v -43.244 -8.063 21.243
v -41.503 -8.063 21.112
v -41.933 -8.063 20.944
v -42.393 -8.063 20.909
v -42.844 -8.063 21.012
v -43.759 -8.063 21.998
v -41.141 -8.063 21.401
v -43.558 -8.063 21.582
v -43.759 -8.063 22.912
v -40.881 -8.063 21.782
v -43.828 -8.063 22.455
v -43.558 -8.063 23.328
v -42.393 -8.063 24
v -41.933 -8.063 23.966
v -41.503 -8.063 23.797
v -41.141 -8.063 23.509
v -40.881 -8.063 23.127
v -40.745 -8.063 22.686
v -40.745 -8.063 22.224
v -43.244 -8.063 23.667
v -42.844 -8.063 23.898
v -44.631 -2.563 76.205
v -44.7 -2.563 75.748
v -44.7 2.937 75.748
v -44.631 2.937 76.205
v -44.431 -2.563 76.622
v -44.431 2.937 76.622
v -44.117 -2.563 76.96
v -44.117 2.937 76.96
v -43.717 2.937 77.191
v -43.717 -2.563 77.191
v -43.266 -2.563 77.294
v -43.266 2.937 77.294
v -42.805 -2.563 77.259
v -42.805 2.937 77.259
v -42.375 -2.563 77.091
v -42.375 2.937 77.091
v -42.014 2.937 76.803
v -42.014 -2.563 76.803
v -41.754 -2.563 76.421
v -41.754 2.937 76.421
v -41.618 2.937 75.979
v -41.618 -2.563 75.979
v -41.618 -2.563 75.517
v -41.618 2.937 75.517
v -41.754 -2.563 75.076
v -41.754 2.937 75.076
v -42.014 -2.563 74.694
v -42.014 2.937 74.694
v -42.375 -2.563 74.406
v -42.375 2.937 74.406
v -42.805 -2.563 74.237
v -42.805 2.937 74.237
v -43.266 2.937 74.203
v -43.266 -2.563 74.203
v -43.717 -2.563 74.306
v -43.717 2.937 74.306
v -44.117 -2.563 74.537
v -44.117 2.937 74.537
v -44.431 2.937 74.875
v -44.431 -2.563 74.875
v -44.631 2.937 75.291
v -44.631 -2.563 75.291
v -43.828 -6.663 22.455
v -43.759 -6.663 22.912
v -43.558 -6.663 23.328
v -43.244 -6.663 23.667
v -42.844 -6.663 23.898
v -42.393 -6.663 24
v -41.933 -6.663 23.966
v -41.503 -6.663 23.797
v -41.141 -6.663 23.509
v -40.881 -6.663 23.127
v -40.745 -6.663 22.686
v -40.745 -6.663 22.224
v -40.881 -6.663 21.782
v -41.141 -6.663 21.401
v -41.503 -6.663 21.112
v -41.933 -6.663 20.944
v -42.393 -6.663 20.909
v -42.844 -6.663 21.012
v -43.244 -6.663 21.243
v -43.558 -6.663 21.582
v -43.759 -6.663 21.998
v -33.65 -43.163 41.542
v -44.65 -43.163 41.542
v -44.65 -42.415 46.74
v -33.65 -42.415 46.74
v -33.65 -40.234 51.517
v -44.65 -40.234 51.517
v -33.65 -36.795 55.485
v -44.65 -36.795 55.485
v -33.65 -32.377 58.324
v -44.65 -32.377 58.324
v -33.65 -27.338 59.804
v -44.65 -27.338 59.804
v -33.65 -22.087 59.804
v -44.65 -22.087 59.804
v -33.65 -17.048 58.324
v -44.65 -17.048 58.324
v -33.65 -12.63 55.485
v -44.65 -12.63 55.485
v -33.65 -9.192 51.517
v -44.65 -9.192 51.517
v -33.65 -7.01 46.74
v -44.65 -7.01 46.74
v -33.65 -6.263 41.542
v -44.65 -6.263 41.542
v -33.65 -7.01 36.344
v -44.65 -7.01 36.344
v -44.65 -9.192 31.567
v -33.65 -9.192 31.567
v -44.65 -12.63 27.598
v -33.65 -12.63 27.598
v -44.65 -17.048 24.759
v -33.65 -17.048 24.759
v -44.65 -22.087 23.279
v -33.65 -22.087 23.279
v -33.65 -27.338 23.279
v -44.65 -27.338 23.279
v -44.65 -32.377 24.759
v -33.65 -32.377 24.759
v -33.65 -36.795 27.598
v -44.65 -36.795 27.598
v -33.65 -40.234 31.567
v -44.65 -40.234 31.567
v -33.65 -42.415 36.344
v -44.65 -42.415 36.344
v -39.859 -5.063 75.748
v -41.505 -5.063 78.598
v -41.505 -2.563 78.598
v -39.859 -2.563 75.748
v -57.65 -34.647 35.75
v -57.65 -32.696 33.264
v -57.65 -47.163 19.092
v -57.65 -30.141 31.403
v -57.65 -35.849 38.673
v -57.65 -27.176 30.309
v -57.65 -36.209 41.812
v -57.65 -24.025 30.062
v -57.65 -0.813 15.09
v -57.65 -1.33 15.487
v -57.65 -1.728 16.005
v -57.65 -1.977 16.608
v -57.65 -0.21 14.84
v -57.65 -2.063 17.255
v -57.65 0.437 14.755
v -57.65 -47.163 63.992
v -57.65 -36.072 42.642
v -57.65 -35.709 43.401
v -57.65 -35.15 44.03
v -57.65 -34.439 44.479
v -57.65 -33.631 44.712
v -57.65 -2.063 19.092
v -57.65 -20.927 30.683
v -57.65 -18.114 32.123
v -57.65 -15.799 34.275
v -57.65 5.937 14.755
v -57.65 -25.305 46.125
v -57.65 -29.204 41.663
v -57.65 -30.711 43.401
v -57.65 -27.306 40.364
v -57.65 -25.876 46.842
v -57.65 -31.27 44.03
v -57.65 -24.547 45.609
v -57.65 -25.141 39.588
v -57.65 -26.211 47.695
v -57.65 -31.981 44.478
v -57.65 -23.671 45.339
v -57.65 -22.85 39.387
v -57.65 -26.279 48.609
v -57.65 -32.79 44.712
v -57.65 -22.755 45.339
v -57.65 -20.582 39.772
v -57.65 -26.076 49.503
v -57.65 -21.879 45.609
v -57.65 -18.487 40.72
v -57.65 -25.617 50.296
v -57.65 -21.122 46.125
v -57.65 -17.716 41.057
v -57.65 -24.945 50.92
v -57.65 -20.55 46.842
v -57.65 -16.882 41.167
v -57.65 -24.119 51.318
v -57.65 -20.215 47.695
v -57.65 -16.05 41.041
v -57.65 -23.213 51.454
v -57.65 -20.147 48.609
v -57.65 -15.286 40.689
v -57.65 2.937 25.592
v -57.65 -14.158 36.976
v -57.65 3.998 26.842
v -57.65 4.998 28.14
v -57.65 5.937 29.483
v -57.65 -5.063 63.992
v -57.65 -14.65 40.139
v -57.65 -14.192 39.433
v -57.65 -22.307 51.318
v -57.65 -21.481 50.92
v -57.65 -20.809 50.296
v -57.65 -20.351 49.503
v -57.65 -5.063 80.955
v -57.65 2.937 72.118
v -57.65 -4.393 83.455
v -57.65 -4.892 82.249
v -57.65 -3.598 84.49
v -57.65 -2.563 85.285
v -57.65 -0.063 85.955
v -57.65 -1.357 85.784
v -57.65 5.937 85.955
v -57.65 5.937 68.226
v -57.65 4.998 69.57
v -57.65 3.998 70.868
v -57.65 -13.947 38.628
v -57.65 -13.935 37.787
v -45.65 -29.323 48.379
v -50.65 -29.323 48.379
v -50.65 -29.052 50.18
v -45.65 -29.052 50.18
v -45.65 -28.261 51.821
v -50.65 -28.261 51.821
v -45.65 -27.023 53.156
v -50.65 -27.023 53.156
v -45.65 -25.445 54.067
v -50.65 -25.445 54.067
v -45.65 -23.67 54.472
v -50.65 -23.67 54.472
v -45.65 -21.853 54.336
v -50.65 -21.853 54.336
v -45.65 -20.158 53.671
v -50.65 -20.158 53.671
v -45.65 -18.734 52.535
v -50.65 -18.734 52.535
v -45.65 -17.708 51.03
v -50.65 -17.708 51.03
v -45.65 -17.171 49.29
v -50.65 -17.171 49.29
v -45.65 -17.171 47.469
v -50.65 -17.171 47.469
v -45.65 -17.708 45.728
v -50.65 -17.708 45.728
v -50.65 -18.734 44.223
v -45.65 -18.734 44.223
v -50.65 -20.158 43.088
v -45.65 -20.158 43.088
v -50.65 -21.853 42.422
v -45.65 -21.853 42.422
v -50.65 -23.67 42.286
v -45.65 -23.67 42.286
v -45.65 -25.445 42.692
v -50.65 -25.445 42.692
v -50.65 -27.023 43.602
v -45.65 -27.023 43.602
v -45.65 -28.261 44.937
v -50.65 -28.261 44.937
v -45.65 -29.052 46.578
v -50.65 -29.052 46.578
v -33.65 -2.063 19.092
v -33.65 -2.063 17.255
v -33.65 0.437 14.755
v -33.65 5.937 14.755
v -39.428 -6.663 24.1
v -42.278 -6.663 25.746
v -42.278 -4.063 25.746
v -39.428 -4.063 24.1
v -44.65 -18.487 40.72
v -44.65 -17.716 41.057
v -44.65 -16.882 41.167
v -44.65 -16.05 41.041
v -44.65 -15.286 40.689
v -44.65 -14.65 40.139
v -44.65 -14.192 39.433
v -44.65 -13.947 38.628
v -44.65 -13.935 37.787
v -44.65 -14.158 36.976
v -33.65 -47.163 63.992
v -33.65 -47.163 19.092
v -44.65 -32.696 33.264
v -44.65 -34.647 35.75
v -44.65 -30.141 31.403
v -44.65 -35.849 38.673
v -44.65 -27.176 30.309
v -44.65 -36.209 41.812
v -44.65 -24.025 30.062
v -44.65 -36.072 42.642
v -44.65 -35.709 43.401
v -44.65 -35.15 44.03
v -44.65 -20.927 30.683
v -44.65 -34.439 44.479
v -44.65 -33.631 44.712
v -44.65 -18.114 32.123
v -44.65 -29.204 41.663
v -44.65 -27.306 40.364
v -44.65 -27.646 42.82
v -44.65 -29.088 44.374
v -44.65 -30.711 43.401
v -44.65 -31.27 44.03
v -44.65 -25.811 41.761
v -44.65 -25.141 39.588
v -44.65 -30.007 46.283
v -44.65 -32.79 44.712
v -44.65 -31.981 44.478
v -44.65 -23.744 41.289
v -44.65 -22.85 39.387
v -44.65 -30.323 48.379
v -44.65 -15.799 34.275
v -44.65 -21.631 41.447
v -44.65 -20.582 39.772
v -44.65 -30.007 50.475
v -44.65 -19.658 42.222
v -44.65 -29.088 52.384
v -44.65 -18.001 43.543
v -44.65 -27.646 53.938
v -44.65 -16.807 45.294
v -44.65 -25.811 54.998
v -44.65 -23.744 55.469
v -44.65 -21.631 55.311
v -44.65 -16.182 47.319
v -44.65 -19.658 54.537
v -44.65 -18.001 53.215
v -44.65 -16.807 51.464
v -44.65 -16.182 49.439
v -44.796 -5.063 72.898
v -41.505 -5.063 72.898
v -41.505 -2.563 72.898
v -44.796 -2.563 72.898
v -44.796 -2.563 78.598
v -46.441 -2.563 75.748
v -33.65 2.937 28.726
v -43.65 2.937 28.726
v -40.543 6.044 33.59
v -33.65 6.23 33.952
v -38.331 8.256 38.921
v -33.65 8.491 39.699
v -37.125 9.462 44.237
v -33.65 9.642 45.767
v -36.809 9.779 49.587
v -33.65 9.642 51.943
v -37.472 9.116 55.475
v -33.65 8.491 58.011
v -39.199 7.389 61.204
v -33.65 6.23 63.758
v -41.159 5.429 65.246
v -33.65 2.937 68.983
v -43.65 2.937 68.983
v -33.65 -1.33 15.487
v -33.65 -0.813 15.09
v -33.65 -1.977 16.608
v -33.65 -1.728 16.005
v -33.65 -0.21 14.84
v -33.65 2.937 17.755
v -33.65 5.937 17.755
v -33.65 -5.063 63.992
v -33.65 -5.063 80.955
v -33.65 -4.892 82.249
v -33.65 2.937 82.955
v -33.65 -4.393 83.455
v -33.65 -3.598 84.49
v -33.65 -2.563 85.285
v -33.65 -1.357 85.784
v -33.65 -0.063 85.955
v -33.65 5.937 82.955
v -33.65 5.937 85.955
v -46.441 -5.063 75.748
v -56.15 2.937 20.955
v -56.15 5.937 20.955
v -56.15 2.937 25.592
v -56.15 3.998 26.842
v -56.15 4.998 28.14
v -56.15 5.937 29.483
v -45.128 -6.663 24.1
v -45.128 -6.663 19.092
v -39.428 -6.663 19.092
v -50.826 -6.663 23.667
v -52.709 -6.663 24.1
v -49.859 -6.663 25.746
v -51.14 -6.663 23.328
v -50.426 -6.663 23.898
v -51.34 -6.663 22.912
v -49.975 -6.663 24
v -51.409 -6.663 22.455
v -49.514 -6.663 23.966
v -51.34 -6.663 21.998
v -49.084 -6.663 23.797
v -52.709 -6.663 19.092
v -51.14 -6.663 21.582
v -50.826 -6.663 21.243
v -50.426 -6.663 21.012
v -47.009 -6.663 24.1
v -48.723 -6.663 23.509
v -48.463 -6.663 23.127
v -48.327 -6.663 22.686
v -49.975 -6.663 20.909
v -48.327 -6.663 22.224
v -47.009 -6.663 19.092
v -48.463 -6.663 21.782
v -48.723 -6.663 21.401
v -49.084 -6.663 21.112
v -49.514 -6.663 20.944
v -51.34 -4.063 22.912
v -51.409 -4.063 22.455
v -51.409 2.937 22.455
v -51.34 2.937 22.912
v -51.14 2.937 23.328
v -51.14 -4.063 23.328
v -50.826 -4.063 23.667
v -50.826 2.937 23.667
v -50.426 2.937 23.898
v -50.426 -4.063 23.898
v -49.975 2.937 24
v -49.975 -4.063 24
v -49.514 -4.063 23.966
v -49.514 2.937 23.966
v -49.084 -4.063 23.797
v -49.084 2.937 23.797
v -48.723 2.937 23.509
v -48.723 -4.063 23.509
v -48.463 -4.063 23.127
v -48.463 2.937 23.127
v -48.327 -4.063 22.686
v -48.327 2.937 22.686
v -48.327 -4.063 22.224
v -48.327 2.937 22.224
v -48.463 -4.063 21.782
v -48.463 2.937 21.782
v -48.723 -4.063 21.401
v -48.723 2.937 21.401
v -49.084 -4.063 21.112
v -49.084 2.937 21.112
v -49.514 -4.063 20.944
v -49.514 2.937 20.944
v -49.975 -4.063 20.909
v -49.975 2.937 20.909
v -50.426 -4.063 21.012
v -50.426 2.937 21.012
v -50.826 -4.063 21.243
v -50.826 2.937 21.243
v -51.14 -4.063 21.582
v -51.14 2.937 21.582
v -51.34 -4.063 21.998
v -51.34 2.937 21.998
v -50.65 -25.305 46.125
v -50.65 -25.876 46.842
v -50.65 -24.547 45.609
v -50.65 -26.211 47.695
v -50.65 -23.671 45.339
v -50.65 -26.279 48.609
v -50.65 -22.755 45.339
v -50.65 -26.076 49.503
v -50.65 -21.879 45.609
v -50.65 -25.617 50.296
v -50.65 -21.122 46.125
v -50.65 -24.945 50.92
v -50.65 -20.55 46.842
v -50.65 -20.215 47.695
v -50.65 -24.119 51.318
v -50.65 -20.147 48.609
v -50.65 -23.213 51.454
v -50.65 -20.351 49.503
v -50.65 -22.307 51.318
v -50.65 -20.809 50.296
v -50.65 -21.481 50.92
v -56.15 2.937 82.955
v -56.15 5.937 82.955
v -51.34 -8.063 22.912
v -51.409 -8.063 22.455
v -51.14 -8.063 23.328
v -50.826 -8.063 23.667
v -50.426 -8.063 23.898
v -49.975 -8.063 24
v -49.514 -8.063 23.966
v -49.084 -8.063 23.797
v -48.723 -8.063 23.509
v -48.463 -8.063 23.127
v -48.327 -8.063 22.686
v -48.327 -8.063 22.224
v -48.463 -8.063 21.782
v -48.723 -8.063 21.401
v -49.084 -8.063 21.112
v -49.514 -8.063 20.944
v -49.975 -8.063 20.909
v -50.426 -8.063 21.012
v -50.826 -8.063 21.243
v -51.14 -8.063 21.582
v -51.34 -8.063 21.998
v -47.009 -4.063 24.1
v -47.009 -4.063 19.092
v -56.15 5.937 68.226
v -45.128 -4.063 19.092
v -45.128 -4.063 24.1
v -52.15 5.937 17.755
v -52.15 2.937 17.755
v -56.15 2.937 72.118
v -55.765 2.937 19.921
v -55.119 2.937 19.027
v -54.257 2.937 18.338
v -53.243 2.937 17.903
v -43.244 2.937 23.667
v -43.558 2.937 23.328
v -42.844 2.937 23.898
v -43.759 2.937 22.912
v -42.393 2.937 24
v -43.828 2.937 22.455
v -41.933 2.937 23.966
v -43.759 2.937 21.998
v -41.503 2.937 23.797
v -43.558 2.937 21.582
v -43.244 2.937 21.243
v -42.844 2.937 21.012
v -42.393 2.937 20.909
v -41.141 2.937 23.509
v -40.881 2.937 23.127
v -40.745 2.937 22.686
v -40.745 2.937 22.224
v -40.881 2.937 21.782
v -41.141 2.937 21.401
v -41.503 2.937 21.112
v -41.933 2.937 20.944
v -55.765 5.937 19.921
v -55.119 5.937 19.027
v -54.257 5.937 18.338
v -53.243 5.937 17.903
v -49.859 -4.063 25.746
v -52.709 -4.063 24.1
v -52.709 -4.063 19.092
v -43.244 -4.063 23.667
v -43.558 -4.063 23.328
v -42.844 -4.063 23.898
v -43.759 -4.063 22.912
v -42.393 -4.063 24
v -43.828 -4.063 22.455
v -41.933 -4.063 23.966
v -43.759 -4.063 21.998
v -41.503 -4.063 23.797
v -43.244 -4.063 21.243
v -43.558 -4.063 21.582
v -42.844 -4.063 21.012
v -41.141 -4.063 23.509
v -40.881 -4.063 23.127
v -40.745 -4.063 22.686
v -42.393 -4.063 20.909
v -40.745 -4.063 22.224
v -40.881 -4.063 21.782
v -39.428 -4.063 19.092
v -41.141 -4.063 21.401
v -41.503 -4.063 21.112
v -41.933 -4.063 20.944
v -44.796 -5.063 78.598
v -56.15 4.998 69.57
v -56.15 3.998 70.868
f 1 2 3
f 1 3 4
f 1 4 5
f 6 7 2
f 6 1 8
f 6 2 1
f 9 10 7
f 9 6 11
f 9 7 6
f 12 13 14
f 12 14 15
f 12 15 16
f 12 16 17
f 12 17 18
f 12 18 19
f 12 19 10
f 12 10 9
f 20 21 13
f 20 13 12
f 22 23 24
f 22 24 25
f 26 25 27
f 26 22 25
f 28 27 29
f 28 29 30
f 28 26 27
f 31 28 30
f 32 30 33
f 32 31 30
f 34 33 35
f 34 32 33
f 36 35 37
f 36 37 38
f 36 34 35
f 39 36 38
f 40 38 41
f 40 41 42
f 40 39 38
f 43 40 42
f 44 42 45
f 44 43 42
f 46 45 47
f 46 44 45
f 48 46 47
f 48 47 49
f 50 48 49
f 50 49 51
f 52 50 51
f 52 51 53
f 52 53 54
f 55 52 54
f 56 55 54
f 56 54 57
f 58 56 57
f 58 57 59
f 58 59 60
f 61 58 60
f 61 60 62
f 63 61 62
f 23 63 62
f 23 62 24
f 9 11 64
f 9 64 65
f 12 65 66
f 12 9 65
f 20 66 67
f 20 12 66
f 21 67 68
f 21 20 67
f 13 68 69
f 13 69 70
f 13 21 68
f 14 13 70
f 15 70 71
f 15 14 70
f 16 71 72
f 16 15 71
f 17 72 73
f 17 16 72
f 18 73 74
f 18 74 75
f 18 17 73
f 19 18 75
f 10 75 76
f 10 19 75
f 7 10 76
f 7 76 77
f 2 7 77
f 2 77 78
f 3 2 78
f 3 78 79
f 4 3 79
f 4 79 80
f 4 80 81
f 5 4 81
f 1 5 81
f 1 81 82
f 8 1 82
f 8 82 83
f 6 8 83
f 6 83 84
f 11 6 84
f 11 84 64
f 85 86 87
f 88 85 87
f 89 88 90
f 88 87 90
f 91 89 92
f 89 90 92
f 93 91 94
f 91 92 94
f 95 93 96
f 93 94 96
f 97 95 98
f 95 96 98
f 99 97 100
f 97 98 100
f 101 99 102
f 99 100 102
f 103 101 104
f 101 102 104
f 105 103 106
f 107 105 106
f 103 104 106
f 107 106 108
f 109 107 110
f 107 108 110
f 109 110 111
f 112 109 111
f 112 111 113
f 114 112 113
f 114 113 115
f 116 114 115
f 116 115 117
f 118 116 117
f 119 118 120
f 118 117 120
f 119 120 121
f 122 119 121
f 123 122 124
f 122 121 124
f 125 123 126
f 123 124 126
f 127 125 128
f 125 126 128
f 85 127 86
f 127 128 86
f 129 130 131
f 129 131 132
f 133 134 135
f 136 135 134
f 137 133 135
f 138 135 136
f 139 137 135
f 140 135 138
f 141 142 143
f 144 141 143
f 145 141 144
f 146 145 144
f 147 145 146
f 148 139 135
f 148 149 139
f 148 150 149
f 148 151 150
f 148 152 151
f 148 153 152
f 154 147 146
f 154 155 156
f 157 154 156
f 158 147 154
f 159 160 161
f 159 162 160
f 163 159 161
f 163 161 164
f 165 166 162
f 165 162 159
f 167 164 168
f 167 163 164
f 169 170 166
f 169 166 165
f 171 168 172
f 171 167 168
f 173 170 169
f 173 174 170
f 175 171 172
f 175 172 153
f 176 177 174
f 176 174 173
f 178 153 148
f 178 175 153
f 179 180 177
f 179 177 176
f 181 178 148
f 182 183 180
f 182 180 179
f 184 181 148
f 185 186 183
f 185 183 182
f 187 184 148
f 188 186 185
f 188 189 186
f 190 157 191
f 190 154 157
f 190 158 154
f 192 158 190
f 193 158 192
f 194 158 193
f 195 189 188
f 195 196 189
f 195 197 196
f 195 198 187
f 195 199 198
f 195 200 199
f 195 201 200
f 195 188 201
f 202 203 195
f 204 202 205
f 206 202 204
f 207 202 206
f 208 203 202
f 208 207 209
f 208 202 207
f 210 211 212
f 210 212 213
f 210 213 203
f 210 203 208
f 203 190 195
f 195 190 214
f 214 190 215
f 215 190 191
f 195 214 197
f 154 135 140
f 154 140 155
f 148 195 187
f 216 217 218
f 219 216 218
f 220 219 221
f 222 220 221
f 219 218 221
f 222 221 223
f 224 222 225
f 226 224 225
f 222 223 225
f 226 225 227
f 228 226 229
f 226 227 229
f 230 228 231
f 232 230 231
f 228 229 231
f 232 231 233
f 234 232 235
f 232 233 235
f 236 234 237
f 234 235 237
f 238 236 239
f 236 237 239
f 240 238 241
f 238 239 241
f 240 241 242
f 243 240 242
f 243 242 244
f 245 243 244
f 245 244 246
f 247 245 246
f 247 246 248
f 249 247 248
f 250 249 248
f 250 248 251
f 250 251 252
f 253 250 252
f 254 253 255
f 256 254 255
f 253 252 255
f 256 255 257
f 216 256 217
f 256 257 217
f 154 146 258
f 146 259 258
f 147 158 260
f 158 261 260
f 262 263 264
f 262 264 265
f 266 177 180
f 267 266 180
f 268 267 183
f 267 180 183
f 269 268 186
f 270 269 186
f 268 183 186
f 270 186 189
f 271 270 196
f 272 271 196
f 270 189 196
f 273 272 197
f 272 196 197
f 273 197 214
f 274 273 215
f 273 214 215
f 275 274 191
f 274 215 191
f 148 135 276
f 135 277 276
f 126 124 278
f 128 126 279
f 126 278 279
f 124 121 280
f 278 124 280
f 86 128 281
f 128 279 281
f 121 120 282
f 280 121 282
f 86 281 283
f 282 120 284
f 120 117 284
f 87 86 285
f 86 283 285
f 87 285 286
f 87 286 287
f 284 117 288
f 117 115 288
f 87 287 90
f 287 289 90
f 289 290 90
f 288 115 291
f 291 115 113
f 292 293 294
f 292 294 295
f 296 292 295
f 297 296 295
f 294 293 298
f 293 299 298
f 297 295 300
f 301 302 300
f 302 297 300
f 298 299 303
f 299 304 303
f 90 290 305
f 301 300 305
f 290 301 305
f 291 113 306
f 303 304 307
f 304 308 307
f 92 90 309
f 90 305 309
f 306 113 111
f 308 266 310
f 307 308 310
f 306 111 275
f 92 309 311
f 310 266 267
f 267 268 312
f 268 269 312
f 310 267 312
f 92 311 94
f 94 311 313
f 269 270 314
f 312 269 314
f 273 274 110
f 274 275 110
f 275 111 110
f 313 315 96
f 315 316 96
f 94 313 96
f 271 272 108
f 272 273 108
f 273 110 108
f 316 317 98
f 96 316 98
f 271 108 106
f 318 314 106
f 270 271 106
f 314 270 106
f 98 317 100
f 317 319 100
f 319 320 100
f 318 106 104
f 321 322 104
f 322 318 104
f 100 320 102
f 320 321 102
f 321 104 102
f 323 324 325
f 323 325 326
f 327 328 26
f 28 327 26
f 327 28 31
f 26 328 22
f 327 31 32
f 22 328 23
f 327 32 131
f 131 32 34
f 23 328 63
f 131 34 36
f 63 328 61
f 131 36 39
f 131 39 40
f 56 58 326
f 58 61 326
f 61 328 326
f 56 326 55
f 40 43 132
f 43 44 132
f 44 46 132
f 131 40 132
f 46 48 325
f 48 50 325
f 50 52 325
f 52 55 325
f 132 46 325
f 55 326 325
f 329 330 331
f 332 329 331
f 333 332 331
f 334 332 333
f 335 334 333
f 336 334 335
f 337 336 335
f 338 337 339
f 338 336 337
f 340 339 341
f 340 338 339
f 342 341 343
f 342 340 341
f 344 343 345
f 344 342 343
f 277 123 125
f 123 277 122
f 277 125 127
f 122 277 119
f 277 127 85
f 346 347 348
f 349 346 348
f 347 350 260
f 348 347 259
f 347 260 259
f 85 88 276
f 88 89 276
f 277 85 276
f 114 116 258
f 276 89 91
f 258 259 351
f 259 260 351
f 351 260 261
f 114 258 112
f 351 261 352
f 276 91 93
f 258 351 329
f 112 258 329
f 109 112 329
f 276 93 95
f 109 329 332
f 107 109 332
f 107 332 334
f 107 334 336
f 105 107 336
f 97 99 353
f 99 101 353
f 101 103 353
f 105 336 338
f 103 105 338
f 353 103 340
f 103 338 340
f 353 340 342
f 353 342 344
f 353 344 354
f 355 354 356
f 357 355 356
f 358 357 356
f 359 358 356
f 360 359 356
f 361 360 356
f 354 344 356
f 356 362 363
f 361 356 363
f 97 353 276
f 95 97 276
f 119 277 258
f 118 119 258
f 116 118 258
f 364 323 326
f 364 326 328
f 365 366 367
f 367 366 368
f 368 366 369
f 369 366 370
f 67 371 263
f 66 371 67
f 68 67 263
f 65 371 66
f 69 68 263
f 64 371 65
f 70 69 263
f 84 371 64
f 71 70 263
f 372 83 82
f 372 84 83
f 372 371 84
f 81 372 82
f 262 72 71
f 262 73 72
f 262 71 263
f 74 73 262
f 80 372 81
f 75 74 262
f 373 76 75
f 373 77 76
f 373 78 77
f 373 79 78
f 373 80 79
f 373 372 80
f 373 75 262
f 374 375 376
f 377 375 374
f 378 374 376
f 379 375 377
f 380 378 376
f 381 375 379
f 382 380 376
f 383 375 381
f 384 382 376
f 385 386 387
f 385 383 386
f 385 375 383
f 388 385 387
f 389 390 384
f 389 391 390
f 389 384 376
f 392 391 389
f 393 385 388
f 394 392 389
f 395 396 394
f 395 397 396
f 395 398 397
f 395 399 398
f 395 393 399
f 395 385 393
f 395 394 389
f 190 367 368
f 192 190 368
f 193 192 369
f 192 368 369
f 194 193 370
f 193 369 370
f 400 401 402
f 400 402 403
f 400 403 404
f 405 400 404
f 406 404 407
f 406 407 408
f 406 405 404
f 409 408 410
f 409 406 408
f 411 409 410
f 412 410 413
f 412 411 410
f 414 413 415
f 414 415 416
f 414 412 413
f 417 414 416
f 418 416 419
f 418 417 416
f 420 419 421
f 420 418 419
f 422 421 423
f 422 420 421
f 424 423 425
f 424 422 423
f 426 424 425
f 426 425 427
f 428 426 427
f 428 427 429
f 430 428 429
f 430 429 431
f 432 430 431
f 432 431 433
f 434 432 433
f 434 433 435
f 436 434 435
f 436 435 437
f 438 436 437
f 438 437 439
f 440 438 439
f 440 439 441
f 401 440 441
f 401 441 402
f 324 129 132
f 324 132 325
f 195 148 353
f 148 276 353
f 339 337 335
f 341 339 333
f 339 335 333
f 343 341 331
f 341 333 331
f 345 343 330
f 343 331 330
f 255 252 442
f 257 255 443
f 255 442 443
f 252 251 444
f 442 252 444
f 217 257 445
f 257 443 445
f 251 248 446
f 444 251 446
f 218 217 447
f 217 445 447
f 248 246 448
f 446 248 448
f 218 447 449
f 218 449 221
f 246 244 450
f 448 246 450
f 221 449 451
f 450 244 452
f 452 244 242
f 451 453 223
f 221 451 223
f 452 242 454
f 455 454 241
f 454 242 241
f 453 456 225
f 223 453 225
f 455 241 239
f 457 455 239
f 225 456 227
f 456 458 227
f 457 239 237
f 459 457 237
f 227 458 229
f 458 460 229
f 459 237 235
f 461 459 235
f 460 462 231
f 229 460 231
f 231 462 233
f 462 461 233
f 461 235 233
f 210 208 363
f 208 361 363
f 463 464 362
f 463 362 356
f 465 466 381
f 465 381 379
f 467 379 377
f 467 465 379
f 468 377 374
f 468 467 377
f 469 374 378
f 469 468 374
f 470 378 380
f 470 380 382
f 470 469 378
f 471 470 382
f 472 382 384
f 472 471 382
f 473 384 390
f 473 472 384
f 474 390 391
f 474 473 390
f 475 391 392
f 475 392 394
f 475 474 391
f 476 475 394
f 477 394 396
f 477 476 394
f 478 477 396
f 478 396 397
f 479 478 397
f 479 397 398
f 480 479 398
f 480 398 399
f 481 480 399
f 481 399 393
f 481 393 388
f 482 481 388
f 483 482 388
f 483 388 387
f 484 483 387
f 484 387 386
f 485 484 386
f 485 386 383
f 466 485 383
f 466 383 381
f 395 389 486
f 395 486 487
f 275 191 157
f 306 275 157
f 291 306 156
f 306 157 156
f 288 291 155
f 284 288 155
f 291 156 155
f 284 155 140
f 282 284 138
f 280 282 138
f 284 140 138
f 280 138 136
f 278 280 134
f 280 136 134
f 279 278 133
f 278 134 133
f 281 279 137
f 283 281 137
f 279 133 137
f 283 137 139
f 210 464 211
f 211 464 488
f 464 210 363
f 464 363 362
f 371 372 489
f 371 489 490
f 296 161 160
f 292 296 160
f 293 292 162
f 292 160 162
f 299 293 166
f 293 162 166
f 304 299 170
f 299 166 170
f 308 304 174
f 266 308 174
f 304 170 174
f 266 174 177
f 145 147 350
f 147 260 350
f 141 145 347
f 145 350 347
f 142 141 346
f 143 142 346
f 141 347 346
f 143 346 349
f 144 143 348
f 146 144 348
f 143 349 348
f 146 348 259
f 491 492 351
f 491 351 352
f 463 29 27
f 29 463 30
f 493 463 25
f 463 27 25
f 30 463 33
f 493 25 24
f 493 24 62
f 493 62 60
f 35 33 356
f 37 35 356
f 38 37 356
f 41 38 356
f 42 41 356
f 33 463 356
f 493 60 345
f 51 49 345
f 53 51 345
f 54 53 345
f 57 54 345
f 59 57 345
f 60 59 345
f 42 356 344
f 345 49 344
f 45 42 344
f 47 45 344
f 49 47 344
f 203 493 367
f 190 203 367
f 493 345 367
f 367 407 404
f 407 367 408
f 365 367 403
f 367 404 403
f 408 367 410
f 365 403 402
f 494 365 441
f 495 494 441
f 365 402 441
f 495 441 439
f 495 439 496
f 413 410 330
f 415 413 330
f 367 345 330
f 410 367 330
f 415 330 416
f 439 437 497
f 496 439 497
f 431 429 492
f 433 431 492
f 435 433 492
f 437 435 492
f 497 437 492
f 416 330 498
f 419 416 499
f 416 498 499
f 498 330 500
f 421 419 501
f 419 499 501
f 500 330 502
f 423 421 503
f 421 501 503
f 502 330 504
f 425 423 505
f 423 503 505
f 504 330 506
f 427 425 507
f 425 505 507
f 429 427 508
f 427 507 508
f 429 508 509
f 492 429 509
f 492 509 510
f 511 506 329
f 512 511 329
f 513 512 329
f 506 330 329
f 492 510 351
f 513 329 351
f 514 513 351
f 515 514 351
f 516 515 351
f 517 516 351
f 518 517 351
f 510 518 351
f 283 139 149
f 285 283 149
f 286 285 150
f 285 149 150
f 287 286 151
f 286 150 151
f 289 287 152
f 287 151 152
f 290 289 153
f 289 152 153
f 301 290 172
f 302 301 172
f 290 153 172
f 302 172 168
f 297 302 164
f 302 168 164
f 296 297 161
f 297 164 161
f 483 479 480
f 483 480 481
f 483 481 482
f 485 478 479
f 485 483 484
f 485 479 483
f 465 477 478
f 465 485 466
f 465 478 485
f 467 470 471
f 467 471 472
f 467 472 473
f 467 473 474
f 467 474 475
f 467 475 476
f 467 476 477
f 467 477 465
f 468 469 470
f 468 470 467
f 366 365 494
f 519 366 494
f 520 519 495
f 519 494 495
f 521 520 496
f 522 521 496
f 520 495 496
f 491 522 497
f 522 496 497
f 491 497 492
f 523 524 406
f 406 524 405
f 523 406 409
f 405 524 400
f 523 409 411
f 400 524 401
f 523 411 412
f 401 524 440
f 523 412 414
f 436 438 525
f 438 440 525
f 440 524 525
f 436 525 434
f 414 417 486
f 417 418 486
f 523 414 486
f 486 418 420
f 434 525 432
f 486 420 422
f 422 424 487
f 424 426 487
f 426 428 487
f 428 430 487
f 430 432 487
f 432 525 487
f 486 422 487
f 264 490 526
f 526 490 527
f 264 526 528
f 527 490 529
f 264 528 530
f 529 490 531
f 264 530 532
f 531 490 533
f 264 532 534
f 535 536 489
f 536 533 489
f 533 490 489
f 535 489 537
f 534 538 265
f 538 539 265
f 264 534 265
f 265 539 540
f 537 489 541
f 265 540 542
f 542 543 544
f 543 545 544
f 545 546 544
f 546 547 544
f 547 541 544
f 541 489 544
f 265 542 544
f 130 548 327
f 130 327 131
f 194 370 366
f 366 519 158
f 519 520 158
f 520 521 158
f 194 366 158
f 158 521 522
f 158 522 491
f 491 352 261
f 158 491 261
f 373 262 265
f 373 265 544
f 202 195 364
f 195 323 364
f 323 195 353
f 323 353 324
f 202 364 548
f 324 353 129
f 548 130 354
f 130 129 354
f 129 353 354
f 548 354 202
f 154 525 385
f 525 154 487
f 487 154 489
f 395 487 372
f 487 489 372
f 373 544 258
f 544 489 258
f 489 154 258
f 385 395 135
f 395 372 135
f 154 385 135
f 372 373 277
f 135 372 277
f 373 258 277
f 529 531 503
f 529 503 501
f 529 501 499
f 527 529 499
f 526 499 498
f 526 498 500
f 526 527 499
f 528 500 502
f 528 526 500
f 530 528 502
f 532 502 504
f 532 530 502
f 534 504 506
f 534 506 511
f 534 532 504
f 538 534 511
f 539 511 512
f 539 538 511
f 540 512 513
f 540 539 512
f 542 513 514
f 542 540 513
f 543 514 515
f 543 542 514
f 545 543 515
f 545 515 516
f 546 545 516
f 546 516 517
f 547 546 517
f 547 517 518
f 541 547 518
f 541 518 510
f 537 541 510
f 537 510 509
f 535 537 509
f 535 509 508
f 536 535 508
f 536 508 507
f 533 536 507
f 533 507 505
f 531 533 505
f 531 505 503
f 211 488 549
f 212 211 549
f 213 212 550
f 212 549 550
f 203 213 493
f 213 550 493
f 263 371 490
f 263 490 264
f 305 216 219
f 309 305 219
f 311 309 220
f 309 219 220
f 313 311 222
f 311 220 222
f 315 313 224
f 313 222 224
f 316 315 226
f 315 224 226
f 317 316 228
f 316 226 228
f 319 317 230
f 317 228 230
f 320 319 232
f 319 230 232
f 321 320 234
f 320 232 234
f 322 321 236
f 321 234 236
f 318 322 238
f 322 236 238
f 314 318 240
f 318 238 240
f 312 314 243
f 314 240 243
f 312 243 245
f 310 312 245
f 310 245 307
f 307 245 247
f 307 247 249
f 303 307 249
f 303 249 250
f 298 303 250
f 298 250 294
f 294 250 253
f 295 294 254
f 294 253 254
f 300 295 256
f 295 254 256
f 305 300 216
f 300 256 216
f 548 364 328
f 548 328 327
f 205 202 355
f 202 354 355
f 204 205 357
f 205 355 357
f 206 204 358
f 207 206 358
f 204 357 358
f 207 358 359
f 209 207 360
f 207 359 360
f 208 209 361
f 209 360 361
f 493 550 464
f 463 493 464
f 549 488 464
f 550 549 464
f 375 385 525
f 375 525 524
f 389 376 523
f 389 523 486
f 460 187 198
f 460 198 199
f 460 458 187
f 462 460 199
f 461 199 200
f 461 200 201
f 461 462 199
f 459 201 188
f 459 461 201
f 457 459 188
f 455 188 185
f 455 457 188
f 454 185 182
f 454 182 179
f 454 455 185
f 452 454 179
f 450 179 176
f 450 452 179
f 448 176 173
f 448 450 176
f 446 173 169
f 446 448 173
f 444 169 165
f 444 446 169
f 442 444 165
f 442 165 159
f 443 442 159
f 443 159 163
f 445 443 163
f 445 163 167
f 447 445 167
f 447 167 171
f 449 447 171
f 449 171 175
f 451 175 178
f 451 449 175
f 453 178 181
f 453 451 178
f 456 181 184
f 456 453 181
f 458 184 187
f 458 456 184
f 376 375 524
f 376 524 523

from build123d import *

# Parameters (mm, degrees)
SKETCH1_R           = 22.45
SKETCH1_R_2         = 18.45
SKETCH1_R_3         = 6.11
SKETCH1_R_4         = 5.25
SKETCH1_R_5         = 3.075
BOSS_EXTRUDE1_DEPTH = 5.5
SKETCH1_3_R         = 22.45
SKETCH1_3_R_2       = 18.45
SKETCH1_3_R_3       = 6.11
BOSS_EXTRUDE2_DEPTH = 6
BOSS_EXTRUDE3_START = -6
SKETCH1_4_R         = 22.45
SKETCH1_4_R_2       = 18.45
BOSS_EXTRUDE3_DEPTH = 11
BOSS_EXTRUDE4_DEPTH = 10
DRAFT1_ANGLE        = 45
BOSS_EXTRUDE5_DEPTH = 3
SKETCH4_R           = 3.075
BOSS_EXTRUDE6_DEPTH = 1.5
CUT_EXTRUDE1_START  = -11
SKETCH3_3_R         = 1.55
CUT_EXTRUDE1_DEPTH  = 11
CUT_EXTRUDE2_START  = -9.6
SKETCH3_4_R         = 1.55
CUT_EXTRUDE2_DEPTH  = 2.6
CUT_EXTRUDE3_START  = -8
SKETCH3_5_R         = 1.55
CUT_EXTRUDE3_DEPTH  = 2.5
CUT_EXTRUDE4_DEPTH  = 13
CHAMFER1_SIZE       = 1


with BuildPart() as part:
    # Sketch1 → Boss-Extrude1 (new body)
    with BuildSketch(Plane.ZY.offset(50.650222499)):
        with Locations((41.541684016, -24.712638018)):
            Circle(SKETCH1_R)
        with Locations((41.541684016, -24.712638018)):
            Circle(SKETCH1_R_2, mode=Mode.SUBTRACT)
        with Locations((41.541684016, -24.712638018)):
            Circle(SKETCH1_R_2)
        with Locations((48.379176073, -23.213070625)):
            Circle(SKETCH1_R_3, mode=Mode.SUBTRACT)
        with Locations((48.379176073, -23.213070625)):
            Circle(SKETCH1_R_3)
        with Locations((48.379176073, -23.213070625)):
            Circle(SKETCH1_R_4, mode=Mode.SUBTRACT)
        with Locations((48.379176073, -23.213070625)):
            Circle(SKETCH1_R_4)
        with Locations((48.379176073, -23.213070625)):
            Circle(SKETCH1_R_5, mode=Mode.SUBTRACT)
        with BuildLine():
            Line((19.091684016, -24.712638018), (19.091684016, -47.162638018))
            Line((19.091684016, -47.162638018), (41.54168412, -47.162638018))
            ThreePointArc((41.54168412, -47.162638018), (25.667136815, -40.587185293), (19.091684016, -24.712638018))
        make_face()
        with BuildLine():
            ThreePointArc((63.991684016, -24.712638018), (57.41623129, -40.587185219), (41.54168412, -47.162638018))
            Line((41.54168412, -47.162638018), (63.991684016, -47.162638018))
            Line((63.991684016, -47.162638018), (63.991684016, -24.712638018))
        make_face()
        with BuildLine():
            Line((19.091684016, -2.062638018), (19.091684016, -24.712638018))
            ThreePointArc((19.091684016, -24.712638018), (41.541684016, -2.262638018), (63.991684016, -24.712638018))
            Line((63.991684016, -24.712638018), (63.991684016, -5.062638018))
            Line((63.991684016, -5.062638018), (80.954804088, -5.062638018))
            ThreePointArc((80.954804088, -5.062638018), (84.490337994, -3.598171924), (85.954804088, -0.062638018))
            Line((85.954804088, -0.062638018), (85.954804088, 5.937361982))
            Line((85.954804088, 5.937361982), (82.954804088, 5.937361982))
            Line((82.954804088, 5.937361982), (82.954804088, 2.937361982))
            Line((82.954804088, 2.937361982), (17.754804088, 2.937361982))
            Line((17.754804088, 2.937361982), (17.754804088, 5.937361982))
            Line((17.754804088, 5.937361982), (14.754804088, 5.937361982))
            Line((14.754804088, 5.937361982), (14.754804088, 0.437361982))
            ThreePointArc((14.754804088, 0.437361982), (15.487037135, -1.330404971), (17.254804088, -2.062638018))
            Line((17.254804088, -2.062638018), (19.091684016, -2.062638018))
        make_face()
    extrude(amount=BOSS_EXTRUDE1_DEPTH)

    # Sketch1<3> → Boss-Extrude2 (add)
    with BuildSketch(Plane.ZY.offset(50.650222499)):
        with Locations((41.541684016, -24.712638018)):
            Circle(SKETCH1_3_R)
        with Locations((41.541684016, -24.712638018)):
            Circle(SKETCH1_3_R_2, mode=Mode.SUBTRACT)
        with Locations((41.541684016, -24.712638018)):
            Circle(SKETCH1_3_R_2)
        with Locations(Location((48.379176073, -23.213070625, 0), (0, 0, 270))):
            Circle(SKETCH1_3_R_3, mode=Mode.SUBTRACT)
        with BuildLine():
            Line((19.091684016, -24.712638018), (19.091684016, -47.162638018))
            Line((19.091684016, -47.162638018), (41.54168412, -47.162638018))
            ThreePointArc((41.54168412, -47.162638018), (25.667136815, -40.587185293), (19.091684016, -24.712638018))
        make_face()
        with BuildLine():
            ThreePointArc((63.991684016, -24.712638018), (57.41623129, -40.587185219), (41.54168412, -47.162638018))
            Line((41.54168412, -47.162638018), (63.991684016, -47.162638018))
            Line((63.991684016, -47.162638018), (63.991684016, -24.712638018))
        make_face()
        with BuildLine():
            Line((19.091684016, -2.062638018), (19.091684016, -24.712638018))
            ThreePointArc((19.091684016, -24.712638018), (41.541684016, -2.262638018), (63.991684016, -24.712638018))
            Line((63.991684016, -24.712638018), (63.991684016, -5.062638018))
            Line((63.991684016, -5.062638018), (80.954804088, -5.062638018))
            ThreePointArc((80.954804088, -5.062638018), (84.490337994, -3.598171924), (85.954804088, -0.062638018))
            Line((85.954804088, -0.062638018), (85.954804088, 5.937361982))
            Line((85.954804088, 5.937361982), (82.954804088, 5.937361982))
            Line((82.954804088, 5.937361982), (82.954804088, 2.937361982))
            Line((82.954804088, 2.937361982), (17.754804088, 2.937361982))
            Line((17.754804088, 2.937361982), (17.754804088, 5.937361982))
            Line((17.754804088, 5.937361982), (14.754804088, 5.937361982))
            Line((14.754804088, 5.937361982), (14.754804088, 0.437361982))
            ThreePointArc((14.754804088, 0.437361982), (15.487037135, -1.330404971), (17.254804088, -2.062638018))
            Line((17.254804088, -2.062638018), (19.091684016, -2.062638018))
        make_face()
    extrude(amount=-BOSS_EXTRUDE2_DEPTH)

    # Sketch1<4> → Boss-Extrude3 (add)
    with BuildSketch(Plane.ZY.offset(50.650222499).offset(BOSS_EXTRUDE3_START)):
        with BuildLine():
            Line((19.091684016, -24.712638018), (19.091684016, -47.162638018))
            Line((19.091684016, -47.162638018), (41.54168412, -47.162638018))
            ThreePointArc((41.54168412, -47.162638018), (25.667136815, -40.587185293), (19.091684016, -24.712638018))
        make_face()
        with BuildLine():
            ThreePointArc((63.991684016, -24.712638018), (57.41623129, -40.587185219), (41.54168412, -47.162638018))
            Line((41.54168412, -47.162638018), (63.991684016, -47.162638018))
            Line((63.991684016, -47.162638018), (63.991684016, -24.712638018))
        make_face()
        with Locations((41.541684016, -24.712638018)):
            Circle(SKETCH1_4_R)
        with Locations(Location((41.541684016, -24.712638018, 0), (0, 0, 270))):
            Circle(SKETCH1_4_R_2, mode=Mode.SUBTRACT)
        with BuildLine():
            Line((19.091684016, -2.062638018), (19.091684016, -24.712638018))
            ThreePointArc((19.091684016, -24.712638018), (41.541684016, -2.262638018), (63.991684016, -24.712638018))
            Line((63.991684016, -24.712638018), (63.991684016, -5.062638018))
            Line((63.991684016, -5.062638018), (80.954804088, -5.062638018))
            ThreePointArc((80.954804088, -5.062638018), (84.490337994, -3.598171924), (85.954804088, -0.062638018))
            Line((85.954804088, -0.062638018), (85.954804088, 5.937361982))
            Line((85.954804088, 5.937361982), (82.954804088, 5.937361982))
            Line((82.954804088, 5.937361982), (82.954804088, 2.937361982))
            Line((82.954804088, 2.937361982), (17.754804088, 2.937361982))
            Line((17.754804088, 2.937361982), (17.754804088, 5.937361982))
            Line((17.754804088, 5.937361982), (14.754804088, 5.937361982))
            Line((14.754804088, 5.937361982), (14.754804088, 0.437361982))
            ThreePointArc((14.754804088, 0.437361982), (15.487037135, -1.330404971), (17.254804088, -2.062638018))
            Line((17.254804088, -2.062638018), (19.091684016, -2.062638018))
        make_face()
    extrude(amount=-BOSS_EXTRUDE3_DEPTH)

    # Sketch2 → Boss-Extrude4 (add)
    with BuildSketch(Plane(origin=(-33.650222499, 0, 0), x_dir=(0, 0, -1), z_dir=(1, 0, 0))):
        with BuildLine():
            Line((-68.983263405, 2.937361982), (-28.72634477, 2.937361982))
            ThreePointArc((-28.72634477, 2.937361982), (-48.854804088, 9.786929375), (-68.983263405, 2.937361982))
        make_face()
    extrude(amount=-BOSS_EXTRUDE4_DEPTH)

    # Draft1
    draft1_faces = [part.faces().sort_by_distance(p)[0] for p in [
        (-43.650222499, 5.703123898, 48.854804088),
    ]]
    draft(draft1_faces, Plane(origin=(-144.97054675, 2.937361982, 0), x_dir=(1, 0, 0), z_dir=(0, 1, 0)), DRAFT1_ANGLE)

    # Sketch3 → Boss-Extrude5 (add)
    with BuildSketch(Plane(origin=(0, 2.937361982, 0), x_dir=(1, 0, 0), z_dir=(0, 1, 0))):
        with BuildLine():
            ThreePointArc((-56.150222499, -20.954804088), (-54.711472194, -18.653241969), (-52.150222499, -17.754804088))
            Line((-52.150222499, -17.754804088), (-56.150222499, -17.754804088))
            Line((-56.150222499, -17.754804088), (-56.150222499, -20.954804088))
        make_face()
    extrude(amount=BOSS_EXTRUDE5_DEPTH)

    # Sketch4 → Boss-Extrude6 (add)
    with BuildSketch(Plane.ZY.offset(56.150222499)):
        with BuildLine():
            Line((20.954804088, 2.937361982), (20.954804088, 5.937361982))
            Line((20.954804088, 5.937361982), (14.754804088, 5.937361982))
            Line((14.754804088, 5.937361982), (14.754804088, 0.437361982))
            ThreePointArc((14.754804088, 0.437361982), (15.487037135, -1.330404971), (17.254804088, -2.062638018))
            Line((17.254804088, -2.062638018), (19.091684016, -2.062638018))
            Line((19.091684016, -2.062638018), (19.091684016, -47.162638018))
            Line((19.091684016, -47.162638018), (63.991684016, -47.162638018))
            Line((63.991684016, -47.162638018), (63.991684016, -5.062638018))
            Line((63.991684016, -5.062638018), (80.954804088, -5.062638018))
            ThreePointArc((80.954804088, -5.062638018), (84.490337994, -3.598171924), (85.954804088, -0.062638018))
            Line((85.954804088, -0.062638018), (85.954804088, 5.937361982))
            Line((85.954804088, 5.937361982), (82.954804088, 5.937361982))
            Line((82.954804088, 5.937361982), (82.954804088, 2.937361982))
            Line((82.954804088, 2.937361982), (72.117539836, 2.937361982))
            Line((72.117539836, 2.937361982), (25.59206834, 2.937361982))
            Line((25.59206834, 2.937361982), (20.954804088, 2.937361982))
        make_face()
        with Locations((48.379176073, -23.213070625)):
            Circle(SKETCH4_R, mode=Mode.SUBTRACT)
        with BuildLine():
            Line((29.48337464, 5.937361982), (20.954804088, 5.937361982))
            Line((20.954804088, 5.937361982), (20.954804088, 2.937361982))
            Line((20.954804088, 2.937361982), (25.59206834, 2.937361982))
            ThreePointArc((25.59206834, 2.937361982), (27.485012079, 4.505731469), (29.48337464, 5.937361982))
        make_face()
        with BuildLine():
            ThreePointArc((68.226233536, 5.937361982), (70.224596096, 4.505731469), (72.117539836, 2.937361982))
            Line((72.117539836, 2.937361982), (82.954804088, 2.937361982))
            Line((82.954804088, 2.937361982), (82.954804088, 5.937361982))
            Line((82.954804088, 5.937361982), (68.226233536, 5.937361982))
        make_face()
    extrude(amount=BOSS_EXTRUDE6_DEPTH)

    # Sketch3<3> → Cut-Extrude1 (cut)
    with BuildSketch(Plane(origin=(0, 2.937361982, 0), x_dir=(1, 0, 0), z_dir=(0, 1, 0)).offset(CUT_EXTRUDE1_START)):
        with Locations(Location((-49.859325965, -22.454804088, 0), (0, 0, 180))):
            Circle(SKETCH3_3_R)
        with Locations(Location((-42.277532896, -22.454804088, 0), (0, 0, 180))):
            Circle(SKETCH3_3_R)
        with Locations(Location((-43.150222499, -75.748357954, 0), (0, 0, 180))):
            Circle(SKETCH3_3_R)
    extrude(amount=CUT_EXTRUDE1_DEPTH, mode=Mode.SUBTRACT)

    # Sketch3<4> → Cut-Extrude2 (cut)
    with BuildSketch(Plane(origin=(0, 2.937361982, 0), x_dir=(1, 0, 0), z_dir=(0, 1, 0)).offset(CUT_EXTRUDE2_START)):
        Polygon((-45.127532896, -20.809355821), (-45.127532896, -24.100252355), (-42.277532896, -25.745700622), (-39.427532896, -24.100252355), (-39.427532896, -20.809355821), (-42.277532896, -19.163907553), align=None)
        with Locations(Location((-42.277532896, -22.454804088, 0), (0, 0, 180))):
            Circle(SKETCH3_4_R, mode=Mode.SUBTRACT)
        Polygon((-52.709325965, -20.809355821), (-52.709325965, -24.100252355), (-49.859325965, -25.745700622), (-47.009325965, -24.100252355), (-47.009325965, -20.809355821), (-49.859325965, -19.163907553), align=None)
        with Locations(Location((-49.859325965, -22.454804088, 0), (0, 0, 180))):
            Circle(SKETCH3_4_R, mode=Mode.SUBTRACT)
        Polygon((-47.009325965, -19.091684016), (-47.009325965, -20.809355821), (-49.859325965, -19.163907553), (-52.709325965, -20.809355821), (-52.709325965, -19.091684016), align=None)
        Polygon((-39.427532896, -19.091684016), (-39.427532896, -20.809355821), (-42.277532896, -19.163907553), (-45.127532896, -20.809355821), (-45.127532896, -19.091684016), align=None)
    extrude(amount=CUT_EXTRUDE2_DEPTH, mode=Mode.SUBTRACT)

    # Sketch3<5> → Cut-Extrude3 (cut)
    with BuildSketch(Plane(origin=(0, 2.937361982, 0), x_dir=(1, 0, 0), z_dir=(0, 1, 0)).offset(CUT_EXTRUDE3_START)):
        Polygon((-44.795670766, -78.598357954), (-41.504774232, -78.598357954), (-39.859325965, -75.748357954), (-41.504774232, -72.898357954), (-44.795670766, -72.898357954), (-46.441119034, -75.748357954), align=None)
        with Locations(Location((-43.150222499, -75.748357954, 0), (0, 0, 180))):
            Circle(SKETCH3_5_R, mode=Mode.SUBTRACT)
    extrude(amount=CUT_EXTRUDE3_DEPTH, mode=Mode.SUBTRACT)

    # Sketch5 → Cut-Extrude4 (cut)
    with BuildSketch(Plane.ZY.offset(57.650222499)):
        with BuildLine():
            ThreePointArc((40.720112365, -18.486682668), (40.436145171, -14.9487232), (36.976058346, -14.157778368))
            ThreePointArc((36.976058346, -14.157778368), (30.30866135, -27.176213022), (41.812330431, -36.209452817))
            ThreePointArc((41.812330431, -36.209452817), (44.623826058, -34.043053291), (43.401089282, -30.710980461))
            ThreePointArc((43.401089282, -30.710980461), (39.588114857, -25.141085845), (40.720112365, -18.486682668))
        make_face()
    extrude(amount=-CUT_EXTRUDE4_DEPTH, mode=Mode.SUBTRACT)

    # Chamfer1
    chamfer1_edges = [part.edges().sort_by_distance(p)[0] for p in [
        (-44.650222499, -17.103070625, 48.379176073),
    ]]
    chamfer(chamfer1_edges, length=CHAMFER1_SIZE)


solid = part.part
